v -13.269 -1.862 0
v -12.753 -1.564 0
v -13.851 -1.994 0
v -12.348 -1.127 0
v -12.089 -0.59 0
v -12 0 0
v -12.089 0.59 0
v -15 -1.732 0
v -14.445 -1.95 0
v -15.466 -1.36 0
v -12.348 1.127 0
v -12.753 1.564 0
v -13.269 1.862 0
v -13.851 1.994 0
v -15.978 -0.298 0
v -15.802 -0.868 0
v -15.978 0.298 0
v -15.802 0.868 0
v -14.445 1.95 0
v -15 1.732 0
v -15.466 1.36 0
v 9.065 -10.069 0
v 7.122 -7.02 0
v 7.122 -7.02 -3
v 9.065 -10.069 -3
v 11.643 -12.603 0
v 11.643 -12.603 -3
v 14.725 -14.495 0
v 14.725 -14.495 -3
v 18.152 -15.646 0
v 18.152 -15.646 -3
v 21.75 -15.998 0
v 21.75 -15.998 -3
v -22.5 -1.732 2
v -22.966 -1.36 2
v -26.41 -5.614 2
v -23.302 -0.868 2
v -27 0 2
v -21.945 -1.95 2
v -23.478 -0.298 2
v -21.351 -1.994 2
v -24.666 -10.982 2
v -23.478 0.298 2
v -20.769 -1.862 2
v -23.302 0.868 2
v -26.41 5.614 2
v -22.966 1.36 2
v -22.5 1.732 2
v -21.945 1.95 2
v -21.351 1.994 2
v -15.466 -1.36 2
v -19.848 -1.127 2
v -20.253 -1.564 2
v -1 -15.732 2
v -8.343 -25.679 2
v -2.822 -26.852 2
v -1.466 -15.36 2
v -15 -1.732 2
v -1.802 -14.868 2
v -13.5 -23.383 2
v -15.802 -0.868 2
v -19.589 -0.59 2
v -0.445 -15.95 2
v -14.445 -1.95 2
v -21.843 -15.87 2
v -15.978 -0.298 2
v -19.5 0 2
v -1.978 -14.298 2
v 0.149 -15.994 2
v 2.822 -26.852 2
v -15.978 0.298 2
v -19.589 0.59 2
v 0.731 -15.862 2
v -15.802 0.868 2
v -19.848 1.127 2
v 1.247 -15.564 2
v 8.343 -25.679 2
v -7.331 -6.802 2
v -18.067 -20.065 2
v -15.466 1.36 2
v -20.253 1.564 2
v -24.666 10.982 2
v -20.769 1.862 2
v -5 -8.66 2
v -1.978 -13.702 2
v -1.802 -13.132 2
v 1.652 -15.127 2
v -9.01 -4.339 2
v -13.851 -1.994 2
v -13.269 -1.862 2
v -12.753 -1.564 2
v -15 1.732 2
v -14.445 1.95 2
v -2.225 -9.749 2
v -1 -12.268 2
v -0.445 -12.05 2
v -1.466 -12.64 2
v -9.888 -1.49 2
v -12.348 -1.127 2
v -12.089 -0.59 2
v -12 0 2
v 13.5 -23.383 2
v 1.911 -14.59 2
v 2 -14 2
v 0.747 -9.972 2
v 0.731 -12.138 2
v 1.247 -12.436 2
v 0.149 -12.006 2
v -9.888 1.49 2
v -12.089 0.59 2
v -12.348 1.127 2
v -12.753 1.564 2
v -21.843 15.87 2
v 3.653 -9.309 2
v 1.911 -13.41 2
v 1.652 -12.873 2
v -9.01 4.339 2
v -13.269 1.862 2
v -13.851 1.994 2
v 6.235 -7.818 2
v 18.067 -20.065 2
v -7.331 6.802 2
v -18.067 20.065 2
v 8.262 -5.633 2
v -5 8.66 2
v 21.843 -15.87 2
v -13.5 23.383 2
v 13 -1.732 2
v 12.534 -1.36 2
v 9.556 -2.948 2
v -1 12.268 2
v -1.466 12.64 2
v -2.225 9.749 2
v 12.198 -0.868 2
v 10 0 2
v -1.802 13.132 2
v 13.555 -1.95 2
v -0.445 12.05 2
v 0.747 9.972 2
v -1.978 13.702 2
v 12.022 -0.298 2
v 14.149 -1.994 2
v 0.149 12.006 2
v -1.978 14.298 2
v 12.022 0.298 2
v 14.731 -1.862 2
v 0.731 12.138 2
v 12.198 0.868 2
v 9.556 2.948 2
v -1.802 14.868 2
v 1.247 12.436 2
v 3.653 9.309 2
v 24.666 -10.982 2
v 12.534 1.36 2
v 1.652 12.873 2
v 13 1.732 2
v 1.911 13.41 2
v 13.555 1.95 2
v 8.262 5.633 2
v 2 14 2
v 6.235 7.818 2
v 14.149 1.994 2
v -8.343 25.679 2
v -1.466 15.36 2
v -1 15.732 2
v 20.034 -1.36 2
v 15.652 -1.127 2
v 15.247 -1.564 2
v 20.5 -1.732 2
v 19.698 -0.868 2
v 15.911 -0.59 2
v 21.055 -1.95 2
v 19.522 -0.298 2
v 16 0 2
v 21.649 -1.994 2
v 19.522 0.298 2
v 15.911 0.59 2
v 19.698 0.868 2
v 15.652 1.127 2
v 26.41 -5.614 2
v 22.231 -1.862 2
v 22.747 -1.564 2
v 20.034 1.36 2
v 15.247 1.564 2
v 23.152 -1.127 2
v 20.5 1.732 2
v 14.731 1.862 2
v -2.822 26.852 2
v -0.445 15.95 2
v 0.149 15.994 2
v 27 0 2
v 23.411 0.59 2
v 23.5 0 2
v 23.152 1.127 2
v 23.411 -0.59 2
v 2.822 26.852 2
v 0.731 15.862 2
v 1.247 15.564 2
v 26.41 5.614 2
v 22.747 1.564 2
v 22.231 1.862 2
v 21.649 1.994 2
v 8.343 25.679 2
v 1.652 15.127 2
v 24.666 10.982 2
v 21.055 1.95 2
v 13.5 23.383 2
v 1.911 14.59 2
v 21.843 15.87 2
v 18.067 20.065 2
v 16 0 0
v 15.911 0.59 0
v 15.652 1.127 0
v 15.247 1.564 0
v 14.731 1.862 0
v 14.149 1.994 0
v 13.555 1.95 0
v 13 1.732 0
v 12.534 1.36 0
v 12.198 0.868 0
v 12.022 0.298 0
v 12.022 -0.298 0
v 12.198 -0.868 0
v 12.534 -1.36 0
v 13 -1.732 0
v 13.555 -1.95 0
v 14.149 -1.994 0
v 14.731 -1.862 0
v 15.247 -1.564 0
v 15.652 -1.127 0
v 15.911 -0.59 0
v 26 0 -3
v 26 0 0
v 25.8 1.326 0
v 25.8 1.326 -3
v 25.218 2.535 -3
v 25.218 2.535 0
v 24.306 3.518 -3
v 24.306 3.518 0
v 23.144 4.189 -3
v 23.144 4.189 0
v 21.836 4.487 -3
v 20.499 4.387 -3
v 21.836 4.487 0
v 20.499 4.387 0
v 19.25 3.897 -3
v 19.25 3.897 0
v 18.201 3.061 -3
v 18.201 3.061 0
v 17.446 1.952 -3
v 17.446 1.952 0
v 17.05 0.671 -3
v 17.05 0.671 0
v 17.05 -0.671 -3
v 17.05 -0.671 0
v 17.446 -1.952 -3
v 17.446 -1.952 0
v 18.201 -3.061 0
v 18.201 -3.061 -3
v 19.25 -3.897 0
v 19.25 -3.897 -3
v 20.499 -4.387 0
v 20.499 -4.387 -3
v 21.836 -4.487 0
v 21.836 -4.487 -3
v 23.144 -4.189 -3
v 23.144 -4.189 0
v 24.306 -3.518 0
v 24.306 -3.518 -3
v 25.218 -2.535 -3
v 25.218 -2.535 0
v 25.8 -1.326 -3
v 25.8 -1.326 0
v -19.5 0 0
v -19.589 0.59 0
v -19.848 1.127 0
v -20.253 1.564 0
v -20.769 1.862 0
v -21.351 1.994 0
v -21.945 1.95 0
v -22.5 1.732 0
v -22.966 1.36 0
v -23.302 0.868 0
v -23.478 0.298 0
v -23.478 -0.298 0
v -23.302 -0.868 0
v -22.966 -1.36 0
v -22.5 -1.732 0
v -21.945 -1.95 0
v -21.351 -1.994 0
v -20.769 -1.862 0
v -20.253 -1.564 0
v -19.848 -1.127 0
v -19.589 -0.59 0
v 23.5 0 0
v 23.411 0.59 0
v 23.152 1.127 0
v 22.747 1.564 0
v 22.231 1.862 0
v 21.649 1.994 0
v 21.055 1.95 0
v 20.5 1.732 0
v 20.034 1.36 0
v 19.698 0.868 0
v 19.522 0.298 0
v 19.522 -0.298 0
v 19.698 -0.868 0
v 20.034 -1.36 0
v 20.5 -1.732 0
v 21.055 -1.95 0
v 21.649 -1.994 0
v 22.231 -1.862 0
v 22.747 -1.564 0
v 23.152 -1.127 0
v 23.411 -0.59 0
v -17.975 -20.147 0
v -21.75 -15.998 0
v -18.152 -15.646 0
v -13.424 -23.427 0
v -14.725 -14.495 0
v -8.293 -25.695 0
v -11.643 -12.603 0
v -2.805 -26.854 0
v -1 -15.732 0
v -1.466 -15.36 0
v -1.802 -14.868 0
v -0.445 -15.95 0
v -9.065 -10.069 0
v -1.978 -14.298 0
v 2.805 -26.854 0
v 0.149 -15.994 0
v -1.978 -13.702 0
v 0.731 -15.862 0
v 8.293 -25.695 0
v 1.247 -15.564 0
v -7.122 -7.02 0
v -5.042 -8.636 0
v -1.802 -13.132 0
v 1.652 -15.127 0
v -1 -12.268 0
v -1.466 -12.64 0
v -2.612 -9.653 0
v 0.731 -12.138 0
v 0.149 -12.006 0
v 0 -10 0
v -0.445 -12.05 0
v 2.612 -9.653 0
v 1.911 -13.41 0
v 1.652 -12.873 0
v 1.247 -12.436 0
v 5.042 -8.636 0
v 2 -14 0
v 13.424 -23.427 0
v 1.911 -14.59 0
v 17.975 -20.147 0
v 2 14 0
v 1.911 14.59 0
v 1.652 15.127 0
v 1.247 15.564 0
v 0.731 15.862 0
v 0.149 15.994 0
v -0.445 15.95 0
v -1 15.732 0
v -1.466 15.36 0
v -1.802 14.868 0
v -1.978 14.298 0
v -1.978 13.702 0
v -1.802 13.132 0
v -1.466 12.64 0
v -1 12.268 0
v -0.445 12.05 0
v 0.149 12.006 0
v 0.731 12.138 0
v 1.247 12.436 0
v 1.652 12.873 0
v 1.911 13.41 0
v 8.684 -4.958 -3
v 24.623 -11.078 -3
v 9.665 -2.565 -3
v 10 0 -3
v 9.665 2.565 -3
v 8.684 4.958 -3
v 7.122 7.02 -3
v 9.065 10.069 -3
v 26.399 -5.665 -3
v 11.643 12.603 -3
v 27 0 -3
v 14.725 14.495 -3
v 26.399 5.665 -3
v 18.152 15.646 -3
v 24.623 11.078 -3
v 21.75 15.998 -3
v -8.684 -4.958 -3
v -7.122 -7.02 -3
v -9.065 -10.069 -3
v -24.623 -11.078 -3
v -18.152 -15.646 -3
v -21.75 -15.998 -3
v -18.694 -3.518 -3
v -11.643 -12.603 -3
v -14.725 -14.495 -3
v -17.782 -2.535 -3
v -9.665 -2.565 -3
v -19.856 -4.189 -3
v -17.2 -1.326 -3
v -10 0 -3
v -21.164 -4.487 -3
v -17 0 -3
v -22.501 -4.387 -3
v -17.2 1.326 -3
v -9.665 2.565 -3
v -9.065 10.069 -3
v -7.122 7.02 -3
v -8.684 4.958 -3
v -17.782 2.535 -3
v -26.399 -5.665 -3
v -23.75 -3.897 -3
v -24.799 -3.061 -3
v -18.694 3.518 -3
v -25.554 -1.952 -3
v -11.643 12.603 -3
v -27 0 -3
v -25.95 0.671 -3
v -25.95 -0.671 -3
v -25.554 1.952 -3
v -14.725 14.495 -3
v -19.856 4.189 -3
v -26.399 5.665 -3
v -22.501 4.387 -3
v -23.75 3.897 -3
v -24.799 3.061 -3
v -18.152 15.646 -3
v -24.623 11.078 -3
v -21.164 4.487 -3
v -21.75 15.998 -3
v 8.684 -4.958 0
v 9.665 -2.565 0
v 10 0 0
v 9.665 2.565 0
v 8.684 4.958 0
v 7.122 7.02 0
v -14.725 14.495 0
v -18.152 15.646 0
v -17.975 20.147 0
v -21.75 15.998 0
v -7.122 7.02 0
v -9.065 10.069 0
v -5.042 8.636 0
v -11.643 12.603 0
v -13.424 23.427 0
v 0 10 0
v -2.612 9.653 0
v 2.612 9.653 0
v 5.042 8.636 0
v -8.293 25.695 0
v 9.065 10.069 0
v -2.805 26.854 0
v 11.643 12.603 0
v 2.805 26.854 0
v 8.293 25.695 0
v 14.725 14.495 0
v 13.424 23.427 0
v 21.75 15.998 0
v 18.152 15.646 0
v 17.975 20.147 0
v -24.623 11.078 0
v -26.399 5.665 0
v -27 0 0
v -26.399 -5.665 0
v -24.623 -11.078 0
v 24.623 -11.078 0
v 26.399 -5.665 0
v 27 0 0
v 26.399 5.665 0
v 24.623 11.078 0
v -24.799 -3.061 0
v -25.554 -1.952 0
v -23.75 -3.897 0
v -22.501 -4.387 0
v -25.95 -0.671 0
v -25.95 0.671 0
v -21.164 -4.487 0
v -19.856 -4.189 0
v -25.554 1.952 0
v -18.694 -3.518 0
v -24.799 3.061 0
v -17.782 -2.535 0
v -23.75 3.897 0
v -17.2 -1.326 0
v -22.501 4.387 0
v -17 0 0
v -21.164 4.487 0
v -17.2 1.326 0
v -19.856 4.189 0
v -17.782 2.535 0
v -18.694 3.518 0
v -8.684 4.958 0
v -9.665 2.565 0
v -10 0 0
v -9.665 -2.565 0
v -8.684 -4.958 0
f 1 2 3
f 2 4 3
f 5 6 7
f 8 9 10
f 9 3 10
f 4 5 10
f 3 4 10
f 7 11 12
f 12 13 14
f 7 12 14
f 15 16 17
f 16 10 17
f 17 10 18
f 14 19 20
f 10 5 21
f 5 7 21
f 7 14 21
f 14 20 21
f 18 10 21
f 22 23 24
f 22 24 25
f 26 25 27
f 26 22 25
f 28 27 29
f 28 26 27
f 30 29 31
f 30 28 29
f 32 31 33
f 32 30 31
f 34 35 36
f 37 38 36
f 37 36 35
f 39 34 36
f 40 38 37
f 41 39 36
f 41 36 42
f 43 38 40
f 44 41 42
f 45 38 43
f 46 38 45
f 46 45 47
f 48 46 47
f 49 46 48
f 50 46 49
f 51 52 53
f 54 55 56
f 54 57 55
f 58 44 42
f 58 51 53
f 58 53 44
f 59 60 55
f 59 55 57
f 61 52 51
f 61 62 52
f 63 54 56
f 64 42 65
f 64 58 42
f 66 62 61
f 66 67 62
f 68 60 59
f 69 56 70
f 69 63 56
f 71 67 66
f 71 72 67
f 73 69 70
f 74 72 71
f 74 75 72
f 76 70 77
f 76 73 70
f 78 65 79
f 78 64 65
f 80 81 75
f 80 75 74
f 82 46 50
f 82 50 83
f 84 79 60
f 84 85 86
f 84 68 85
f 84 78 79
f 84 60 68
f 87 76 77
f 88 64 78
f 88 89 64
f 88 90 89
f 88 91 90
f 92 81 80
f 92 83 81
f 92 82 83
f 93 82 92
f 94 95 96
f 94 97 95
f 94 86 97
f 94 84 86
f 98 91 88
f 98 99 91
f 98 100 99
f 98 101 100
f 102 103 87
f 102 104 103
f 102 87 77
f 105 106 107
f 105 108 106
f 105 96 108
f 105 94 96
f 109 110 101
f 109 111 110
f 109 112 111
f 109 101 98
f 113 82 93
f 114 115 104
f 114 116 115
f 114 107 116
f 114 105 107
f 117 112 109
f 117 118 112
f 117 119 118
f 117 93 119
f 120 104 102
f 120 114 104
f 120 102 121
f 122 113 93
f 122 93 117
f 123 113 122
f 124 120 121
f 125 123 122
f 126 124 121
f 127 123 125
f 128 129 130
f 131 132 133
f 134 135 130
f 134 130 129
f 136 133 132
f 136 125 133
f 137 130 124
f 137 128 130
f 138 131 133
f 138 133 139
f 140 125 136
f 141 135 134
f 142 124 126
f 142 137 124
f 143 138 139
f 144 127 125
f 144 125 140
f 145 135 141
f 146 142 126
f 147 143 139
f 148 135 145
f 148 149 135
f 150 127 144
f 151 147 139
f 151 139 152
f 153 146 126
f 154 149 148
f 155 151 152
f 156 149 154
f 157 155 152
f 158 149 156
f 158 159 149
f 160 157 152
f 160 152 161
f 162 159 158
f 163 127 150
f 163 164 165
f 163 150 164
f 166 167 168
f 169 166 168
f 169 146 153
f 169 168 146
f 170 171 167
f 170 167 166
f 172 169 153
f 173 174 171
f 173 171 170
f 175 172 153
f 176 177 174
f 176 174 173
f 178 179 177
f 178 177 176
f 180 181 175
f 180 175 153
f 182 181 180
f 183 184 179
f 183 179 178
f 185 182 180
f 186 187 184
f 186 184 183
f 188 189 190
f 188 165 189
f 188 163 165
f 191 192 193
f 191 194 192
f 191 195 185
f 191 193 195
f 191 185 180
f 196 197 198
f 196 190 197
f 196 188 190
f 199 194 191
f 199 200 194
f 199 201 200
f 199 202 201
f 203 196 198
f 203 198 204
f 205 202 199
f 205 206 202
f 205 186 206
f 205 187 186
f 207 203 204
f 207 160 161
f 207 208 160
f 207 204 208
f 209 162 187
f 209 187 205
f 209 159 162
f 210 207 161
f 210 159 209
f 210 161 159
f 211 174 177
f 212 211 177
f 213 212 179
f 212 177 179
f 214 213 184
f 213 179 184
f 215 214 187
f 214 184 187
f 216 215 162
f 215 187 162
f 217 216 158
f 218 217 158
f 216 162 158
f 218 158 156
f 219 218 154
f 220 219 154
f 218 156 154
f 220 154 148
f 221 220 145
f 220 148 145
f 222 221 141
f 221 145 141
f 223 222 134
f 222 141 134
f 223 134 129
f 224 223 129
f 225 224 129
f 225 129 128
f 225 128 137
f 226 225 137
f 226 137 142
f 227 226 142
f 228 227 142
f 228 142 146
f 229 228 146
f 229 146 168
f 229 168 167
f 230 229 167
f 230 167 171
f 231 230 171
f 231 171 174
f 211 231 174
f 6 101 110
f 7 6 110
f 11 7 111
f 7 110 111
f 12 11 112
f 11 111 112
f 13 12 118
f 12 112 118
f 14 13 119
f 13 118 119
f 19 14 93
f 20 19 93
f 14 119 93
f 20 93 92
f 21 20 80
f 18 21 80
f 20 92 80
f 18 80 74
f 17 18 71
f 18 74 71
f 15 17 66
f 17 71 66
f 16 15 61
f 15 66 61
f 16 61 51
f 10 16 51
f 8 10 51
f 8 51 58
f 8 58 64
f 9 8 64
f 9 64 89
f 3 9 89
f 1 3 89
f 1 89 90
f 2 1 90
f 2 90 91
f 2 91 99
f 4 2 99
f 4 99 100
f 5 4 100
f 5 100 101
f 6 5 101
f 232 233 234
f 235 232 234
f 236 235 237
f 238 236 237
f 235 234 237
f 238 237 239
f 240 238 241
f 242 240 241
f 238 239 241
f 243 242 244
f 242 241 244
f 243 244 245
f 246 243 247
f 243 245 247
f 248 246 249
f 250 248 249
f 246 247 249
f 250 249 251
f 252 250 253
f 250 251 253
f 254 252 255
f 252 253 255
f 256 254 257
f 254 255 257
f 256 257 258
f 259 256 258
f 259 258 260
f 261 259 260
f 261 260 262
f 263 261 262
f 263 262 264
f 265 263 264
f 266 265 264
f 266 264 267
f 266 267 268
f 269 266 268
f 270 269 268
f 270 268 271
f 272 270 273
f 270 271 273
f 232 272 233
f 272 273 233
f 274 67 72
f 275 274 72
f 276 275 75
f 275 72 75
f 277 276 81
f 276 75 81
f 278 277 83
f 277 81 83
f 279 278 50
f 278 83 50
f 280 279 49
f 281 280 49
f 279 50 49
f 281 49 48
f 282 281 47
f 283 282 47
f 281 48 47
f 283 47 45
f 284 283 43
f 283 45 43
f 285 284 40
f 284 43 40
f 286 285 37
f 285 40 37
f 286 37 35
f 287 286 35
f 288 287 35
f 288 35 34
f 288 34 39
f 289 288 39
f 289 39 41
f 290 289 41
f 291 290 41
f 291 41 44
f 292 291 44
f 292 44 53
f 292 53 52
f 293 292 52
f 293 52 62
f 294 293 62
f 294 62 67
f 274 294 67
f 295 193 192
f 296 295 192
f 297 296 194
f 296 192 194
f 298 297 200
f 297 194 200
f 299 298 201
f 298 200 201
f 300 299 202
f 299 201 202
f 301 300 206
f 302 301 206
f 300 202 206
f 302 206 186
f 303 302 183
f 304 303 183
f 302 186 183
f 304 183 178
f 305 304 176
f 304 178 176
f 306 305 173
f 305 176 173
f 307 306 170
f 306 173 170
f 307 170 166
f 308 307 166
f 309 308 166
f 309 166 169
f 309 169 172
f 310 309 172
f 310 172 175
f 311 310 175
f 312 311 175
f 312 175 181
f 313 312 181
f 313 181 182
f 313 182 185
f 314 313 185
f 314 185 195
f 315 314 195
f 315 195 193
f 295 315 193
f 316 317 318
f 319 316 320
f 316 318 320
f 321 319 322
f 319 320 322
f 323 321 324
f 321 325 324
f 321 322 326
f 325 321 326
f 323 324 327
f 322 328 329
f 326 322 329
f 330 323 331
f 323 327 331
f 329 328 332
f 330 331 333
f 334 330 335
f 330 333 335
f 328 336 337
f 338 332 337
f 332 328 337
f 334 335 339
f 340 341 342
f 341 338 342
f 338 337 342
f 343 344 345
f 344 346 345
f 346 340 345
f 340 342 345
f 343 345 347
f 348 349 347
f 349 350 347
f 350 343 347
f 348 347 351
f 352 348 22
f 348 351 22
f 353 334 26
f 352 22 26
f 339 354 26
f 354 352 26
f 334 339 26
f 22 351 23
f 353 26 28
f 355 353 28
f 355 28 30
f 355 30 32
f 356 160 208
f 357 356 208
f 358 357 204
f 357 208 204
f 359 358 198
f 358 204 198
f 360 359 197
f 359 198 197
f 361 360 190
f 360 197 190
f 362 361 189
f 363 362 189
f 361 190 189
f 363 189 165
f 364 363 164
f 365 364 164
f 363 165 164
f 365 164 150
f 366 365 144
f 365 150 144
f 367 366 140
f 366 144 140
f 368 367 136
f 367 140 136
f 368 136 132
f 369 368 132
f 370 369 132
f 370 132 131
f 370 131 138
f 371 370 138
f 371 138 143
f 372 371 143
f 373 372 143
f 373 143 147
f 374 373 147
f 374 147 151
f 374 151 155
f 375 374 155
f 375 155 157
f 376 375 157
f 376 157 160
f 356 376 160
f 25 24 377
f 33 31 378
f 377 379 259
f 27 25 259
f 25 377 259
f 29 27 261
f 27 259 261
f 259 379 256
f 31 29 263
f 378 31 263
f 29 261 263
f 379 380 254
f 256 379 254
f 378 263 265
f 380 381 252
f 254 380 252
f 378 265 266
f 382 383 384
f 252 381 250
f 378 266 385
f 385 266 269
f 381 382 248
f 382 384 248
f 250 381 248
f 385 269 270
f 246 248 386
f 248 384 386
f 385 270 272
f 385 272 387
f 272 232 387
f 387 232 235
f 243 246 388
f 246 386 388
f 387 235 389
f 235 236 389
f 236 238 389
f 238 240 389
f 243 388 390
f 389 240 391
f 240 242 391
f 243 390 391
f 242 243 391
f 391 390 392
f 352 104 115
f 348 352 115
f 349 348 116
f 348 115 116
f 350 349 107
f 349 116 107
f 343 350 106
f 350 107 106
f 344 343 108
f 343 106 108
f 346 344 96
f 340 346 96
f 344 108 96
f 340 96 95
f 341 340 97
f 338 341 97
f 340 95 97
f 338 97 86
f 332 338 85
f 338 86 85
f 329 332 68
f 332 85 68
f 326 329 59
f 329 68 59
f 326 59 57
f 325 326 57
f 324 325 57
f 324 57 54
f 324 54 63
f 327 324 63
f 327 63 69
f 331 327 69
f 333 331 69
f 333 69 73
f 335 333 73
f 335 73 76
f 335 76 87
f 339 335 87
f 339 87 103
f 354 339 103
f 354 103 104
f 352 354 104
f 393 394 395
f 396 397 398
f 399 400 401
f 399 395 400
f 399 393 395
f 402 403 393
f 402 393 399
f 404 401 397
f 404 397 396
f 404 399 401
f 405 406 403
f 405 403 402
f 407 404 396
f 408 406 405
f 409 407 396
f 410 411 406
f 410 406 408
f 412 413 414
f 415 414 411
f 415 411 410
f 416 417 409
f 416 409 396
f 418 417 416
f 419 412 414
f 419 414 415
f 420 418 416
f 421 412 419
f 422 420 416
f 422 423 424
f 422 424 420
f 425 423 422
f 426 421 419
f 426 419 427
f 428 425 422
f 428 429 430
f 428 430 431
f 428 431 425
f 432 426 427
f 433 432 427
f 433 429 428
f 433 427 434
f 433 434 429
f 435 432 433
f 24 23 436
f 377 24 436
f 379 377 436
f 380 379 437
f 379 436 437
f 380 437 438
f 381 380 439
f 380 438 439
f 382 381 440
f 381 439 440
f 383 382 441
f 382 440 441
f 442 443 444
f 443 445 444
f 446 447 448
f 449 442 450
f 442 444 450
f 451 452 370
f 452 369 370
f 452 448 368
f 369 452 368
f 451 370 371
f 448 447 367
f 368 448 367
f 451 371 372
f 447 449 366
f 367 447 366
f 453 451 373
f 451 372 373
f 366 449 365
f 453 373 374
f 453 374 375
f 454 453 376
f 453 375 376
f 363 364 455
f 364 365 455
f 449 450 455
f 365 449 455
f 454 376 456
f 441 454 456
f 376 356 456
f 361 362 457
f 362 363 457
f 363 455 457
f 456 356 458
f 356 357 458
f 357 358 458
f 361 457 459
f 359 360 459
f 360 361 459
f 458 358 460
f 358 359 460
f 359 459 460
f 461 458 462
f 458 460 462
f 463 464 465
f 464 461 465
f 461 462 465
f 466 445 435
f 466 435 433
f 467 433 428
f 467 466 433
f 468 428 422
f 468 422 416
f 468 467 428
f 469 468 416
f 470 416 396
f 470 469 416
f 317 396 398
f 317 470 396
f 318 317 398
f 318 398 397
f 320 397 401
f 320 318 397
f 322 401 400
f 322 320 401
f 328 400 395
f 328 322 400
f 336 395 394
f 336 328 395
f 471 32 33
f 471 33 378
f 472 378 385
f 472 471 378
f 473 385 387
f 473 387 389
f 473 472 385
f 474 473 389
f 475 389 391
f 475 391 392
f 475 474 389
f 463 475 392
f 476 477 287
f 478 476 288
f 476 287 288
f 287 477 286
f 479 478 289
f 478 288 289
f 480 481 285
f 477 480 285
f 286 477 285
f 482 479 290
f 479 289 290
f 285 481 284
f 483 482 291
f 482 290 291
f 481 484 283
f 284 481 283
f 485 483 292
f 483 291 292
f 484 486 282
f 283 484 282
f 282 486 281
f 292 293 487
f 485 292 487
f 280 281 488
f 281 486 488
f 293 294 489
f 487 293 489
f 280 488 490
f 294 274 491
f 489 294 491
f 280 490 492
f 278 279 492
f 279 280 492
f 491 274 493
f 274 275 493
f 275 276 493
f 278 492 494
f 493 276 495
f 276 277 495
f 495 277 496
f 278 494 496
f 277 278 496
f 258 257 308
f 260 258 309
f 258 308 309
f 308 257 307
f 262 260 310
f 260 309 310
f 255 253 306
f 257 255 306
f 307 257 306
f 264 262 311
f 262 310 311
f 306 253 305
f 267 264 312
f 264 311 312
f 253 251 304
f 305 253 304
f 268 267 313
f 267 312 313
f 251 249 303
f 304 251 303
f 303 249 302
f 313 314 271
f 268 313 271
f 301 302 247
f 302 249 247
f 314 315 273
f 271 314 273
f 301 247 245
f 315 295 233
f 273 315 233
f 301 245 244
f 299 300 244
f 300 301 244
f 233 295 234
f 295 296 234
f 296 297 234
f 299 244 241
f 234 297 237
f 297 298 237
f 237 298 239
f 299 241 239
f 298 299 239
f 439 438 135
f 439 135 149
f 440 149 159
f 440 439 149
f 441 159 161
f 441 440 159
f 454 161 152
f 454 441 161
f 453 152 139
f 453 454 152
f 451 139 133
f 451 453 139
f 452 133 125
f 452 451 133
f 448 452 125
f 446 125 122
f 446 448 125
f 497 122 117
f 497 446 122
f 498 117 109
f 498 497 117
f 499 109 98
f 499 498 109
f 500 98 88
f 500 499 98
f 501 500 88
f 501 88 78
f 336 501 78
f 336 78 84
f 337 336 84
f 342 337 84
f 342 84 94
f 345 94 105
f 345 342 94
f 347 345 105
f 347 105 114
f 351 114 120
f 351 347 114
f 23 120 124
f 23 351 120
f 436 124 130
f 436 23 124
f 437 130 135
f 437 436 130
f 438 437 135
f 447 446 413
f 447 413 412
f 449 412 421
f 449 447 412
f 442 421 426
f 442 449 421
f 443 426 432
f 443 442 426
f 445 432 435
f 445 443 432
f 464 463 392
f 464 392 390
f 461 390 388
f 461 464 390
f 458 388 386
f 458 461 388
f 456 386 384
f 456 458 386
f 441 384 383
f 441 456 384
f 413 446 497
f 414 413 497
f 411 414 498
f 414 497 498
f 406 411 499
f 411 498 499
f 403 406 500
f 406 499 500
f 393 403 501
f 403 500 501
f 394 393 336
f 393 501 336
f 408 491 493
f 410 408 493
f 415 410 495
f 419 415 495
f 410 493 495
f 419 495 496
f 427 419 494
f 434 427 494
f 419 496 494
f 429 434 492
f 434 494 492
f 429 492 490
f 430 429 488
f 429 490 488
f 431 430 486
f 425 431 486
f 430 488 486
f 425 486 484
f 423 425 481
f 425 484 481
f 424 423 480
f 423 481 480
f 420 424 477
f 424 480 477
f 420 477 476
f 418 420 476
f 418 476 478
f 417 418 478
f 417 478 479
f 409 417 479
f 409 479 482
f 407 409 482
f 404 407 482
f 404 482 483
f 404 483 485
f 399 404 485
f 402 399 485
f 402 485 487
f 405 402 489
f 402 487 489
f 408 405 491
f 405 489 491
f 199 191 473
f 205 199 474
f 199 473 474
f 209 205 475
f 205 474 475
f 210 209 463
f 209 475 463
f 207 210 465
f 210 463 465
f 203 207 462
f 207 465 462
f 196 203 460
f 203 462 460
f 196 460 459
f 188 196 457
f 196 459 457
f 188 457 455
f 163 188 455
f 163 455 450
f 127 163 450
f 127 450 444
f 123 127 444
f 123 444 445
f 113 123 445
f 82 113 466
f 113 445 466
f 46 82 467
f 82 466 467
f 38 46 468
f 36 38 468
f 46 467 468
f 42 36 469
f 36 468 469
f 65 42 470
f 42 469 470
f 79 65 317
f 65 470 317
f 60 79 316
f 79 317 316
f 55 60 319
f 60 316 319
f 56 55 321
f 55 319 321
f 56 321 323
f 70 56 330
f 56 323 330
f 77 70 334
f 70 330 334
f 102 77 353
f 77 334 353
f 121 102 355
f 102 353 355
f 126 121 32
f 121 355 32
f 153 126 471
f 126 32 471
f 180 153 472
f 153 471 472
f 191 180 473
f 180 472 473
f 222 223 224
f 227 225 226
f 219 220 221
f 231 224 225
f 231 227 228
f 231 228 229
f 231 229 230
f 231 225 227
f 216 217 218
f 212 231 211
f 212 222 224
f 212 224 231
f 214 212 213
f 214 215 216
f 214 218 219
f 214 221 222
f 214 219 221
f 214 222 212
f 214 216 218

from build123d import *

# Parameters (mm, degrees)
SKETCH_R        = 27
SKETCH_R_2      = 10
PAD_DEPTH       = 2
SKETCH001_R     = 2
POCKET_DEPTH    = 2.001
SKETCH004_R     = 2
POCKET002_DEPTH = 2.001
SKETCH005_R     = 4.5
PAD001_DEPTH    = 3


with BuildPart() as part:
    # Sketch → Pad (new body)
    with BuildSketch(Plane.XY):
        Circle(SKETCH_R)
        Circle(SKETCH_R_2, mode=Mode.SUBTRACT)
    extrude(amount=PAD_DEPTH)

    # Sketch001 (on Face4 of Pad) → Pocket (cut, through all)
    with BuildSketch(Plane.XY.offset(2)):
        with Locations((0, 14)):
            Circle(SKETCH001_R)
        with Locations((14, 0)):
            Circle(SKETCH001_R)
        with Locations((0, -14)):
            Circle(SKETCH001_R)
        with Locations((-14, 0)):
            Circle(SKETCH001_R)
    extrude(amount=-POCKET_DEPTH, mode=Mode.SUBTRACT)

    # Sketch004 → Pocket002 (cut, through all)
    with BuildSketch(Plane.XY.offset(2)):
        with Locations((-21.5, 0)):
            Circle(SKETCH004_R)
        with Locations((21.5, 0)):
            Circle(SKETCH004_R)
    extrude(amount=-POCKET002_DEPTH, mode=Mode.SUBTRACT)

    # Sketch005 → Pad001 (join)
    with BuildSketch(Plane.XY):
        with BuildLine():
            ThreePointArc((21.75, 15.998047), (13.130278, 13.636266), (7.122093, 7.019672))
            ThreePointArc((7.122093, -7.019672), (10, 0), (7.122093, 7.019672))
            ThreePointArc((7.122093, -7.019672), (13.130278, -13.636266), (21.75, -15.998047))
            ThreePointArc((21.75, -15.998047), (27, 0), (21.75, 15.998047))
        make_face()
        with Locations((21.5, 0)):
            Circle(SKETCH005_R, mode=Mode.SUBTRACT)
        with BuildLine():
            ThreePointArc((-7.122093, 7.019672), (-10, 0), (-7.122093, -7.019672))
            ThreePointArc((-21.75, -15.998047), (-13.130278, -13.636266), (-7.122093, -7.019672))
            ThreePointArc((-21.75, 15.998047), (-27, 0), (-21.75, -15.998047))
            ThreePointArc((-7.122093, 7.019672), (-13.130278, 13.636266), (-21.75, 15.998047))
        make_face()
        with Locations((-21.5, 0)):
            Circle(SKETCH005_R, mode=Mode.SUBTRACT)
    extrude(amount=-PAD001_DEPTH)


solid = part.part
